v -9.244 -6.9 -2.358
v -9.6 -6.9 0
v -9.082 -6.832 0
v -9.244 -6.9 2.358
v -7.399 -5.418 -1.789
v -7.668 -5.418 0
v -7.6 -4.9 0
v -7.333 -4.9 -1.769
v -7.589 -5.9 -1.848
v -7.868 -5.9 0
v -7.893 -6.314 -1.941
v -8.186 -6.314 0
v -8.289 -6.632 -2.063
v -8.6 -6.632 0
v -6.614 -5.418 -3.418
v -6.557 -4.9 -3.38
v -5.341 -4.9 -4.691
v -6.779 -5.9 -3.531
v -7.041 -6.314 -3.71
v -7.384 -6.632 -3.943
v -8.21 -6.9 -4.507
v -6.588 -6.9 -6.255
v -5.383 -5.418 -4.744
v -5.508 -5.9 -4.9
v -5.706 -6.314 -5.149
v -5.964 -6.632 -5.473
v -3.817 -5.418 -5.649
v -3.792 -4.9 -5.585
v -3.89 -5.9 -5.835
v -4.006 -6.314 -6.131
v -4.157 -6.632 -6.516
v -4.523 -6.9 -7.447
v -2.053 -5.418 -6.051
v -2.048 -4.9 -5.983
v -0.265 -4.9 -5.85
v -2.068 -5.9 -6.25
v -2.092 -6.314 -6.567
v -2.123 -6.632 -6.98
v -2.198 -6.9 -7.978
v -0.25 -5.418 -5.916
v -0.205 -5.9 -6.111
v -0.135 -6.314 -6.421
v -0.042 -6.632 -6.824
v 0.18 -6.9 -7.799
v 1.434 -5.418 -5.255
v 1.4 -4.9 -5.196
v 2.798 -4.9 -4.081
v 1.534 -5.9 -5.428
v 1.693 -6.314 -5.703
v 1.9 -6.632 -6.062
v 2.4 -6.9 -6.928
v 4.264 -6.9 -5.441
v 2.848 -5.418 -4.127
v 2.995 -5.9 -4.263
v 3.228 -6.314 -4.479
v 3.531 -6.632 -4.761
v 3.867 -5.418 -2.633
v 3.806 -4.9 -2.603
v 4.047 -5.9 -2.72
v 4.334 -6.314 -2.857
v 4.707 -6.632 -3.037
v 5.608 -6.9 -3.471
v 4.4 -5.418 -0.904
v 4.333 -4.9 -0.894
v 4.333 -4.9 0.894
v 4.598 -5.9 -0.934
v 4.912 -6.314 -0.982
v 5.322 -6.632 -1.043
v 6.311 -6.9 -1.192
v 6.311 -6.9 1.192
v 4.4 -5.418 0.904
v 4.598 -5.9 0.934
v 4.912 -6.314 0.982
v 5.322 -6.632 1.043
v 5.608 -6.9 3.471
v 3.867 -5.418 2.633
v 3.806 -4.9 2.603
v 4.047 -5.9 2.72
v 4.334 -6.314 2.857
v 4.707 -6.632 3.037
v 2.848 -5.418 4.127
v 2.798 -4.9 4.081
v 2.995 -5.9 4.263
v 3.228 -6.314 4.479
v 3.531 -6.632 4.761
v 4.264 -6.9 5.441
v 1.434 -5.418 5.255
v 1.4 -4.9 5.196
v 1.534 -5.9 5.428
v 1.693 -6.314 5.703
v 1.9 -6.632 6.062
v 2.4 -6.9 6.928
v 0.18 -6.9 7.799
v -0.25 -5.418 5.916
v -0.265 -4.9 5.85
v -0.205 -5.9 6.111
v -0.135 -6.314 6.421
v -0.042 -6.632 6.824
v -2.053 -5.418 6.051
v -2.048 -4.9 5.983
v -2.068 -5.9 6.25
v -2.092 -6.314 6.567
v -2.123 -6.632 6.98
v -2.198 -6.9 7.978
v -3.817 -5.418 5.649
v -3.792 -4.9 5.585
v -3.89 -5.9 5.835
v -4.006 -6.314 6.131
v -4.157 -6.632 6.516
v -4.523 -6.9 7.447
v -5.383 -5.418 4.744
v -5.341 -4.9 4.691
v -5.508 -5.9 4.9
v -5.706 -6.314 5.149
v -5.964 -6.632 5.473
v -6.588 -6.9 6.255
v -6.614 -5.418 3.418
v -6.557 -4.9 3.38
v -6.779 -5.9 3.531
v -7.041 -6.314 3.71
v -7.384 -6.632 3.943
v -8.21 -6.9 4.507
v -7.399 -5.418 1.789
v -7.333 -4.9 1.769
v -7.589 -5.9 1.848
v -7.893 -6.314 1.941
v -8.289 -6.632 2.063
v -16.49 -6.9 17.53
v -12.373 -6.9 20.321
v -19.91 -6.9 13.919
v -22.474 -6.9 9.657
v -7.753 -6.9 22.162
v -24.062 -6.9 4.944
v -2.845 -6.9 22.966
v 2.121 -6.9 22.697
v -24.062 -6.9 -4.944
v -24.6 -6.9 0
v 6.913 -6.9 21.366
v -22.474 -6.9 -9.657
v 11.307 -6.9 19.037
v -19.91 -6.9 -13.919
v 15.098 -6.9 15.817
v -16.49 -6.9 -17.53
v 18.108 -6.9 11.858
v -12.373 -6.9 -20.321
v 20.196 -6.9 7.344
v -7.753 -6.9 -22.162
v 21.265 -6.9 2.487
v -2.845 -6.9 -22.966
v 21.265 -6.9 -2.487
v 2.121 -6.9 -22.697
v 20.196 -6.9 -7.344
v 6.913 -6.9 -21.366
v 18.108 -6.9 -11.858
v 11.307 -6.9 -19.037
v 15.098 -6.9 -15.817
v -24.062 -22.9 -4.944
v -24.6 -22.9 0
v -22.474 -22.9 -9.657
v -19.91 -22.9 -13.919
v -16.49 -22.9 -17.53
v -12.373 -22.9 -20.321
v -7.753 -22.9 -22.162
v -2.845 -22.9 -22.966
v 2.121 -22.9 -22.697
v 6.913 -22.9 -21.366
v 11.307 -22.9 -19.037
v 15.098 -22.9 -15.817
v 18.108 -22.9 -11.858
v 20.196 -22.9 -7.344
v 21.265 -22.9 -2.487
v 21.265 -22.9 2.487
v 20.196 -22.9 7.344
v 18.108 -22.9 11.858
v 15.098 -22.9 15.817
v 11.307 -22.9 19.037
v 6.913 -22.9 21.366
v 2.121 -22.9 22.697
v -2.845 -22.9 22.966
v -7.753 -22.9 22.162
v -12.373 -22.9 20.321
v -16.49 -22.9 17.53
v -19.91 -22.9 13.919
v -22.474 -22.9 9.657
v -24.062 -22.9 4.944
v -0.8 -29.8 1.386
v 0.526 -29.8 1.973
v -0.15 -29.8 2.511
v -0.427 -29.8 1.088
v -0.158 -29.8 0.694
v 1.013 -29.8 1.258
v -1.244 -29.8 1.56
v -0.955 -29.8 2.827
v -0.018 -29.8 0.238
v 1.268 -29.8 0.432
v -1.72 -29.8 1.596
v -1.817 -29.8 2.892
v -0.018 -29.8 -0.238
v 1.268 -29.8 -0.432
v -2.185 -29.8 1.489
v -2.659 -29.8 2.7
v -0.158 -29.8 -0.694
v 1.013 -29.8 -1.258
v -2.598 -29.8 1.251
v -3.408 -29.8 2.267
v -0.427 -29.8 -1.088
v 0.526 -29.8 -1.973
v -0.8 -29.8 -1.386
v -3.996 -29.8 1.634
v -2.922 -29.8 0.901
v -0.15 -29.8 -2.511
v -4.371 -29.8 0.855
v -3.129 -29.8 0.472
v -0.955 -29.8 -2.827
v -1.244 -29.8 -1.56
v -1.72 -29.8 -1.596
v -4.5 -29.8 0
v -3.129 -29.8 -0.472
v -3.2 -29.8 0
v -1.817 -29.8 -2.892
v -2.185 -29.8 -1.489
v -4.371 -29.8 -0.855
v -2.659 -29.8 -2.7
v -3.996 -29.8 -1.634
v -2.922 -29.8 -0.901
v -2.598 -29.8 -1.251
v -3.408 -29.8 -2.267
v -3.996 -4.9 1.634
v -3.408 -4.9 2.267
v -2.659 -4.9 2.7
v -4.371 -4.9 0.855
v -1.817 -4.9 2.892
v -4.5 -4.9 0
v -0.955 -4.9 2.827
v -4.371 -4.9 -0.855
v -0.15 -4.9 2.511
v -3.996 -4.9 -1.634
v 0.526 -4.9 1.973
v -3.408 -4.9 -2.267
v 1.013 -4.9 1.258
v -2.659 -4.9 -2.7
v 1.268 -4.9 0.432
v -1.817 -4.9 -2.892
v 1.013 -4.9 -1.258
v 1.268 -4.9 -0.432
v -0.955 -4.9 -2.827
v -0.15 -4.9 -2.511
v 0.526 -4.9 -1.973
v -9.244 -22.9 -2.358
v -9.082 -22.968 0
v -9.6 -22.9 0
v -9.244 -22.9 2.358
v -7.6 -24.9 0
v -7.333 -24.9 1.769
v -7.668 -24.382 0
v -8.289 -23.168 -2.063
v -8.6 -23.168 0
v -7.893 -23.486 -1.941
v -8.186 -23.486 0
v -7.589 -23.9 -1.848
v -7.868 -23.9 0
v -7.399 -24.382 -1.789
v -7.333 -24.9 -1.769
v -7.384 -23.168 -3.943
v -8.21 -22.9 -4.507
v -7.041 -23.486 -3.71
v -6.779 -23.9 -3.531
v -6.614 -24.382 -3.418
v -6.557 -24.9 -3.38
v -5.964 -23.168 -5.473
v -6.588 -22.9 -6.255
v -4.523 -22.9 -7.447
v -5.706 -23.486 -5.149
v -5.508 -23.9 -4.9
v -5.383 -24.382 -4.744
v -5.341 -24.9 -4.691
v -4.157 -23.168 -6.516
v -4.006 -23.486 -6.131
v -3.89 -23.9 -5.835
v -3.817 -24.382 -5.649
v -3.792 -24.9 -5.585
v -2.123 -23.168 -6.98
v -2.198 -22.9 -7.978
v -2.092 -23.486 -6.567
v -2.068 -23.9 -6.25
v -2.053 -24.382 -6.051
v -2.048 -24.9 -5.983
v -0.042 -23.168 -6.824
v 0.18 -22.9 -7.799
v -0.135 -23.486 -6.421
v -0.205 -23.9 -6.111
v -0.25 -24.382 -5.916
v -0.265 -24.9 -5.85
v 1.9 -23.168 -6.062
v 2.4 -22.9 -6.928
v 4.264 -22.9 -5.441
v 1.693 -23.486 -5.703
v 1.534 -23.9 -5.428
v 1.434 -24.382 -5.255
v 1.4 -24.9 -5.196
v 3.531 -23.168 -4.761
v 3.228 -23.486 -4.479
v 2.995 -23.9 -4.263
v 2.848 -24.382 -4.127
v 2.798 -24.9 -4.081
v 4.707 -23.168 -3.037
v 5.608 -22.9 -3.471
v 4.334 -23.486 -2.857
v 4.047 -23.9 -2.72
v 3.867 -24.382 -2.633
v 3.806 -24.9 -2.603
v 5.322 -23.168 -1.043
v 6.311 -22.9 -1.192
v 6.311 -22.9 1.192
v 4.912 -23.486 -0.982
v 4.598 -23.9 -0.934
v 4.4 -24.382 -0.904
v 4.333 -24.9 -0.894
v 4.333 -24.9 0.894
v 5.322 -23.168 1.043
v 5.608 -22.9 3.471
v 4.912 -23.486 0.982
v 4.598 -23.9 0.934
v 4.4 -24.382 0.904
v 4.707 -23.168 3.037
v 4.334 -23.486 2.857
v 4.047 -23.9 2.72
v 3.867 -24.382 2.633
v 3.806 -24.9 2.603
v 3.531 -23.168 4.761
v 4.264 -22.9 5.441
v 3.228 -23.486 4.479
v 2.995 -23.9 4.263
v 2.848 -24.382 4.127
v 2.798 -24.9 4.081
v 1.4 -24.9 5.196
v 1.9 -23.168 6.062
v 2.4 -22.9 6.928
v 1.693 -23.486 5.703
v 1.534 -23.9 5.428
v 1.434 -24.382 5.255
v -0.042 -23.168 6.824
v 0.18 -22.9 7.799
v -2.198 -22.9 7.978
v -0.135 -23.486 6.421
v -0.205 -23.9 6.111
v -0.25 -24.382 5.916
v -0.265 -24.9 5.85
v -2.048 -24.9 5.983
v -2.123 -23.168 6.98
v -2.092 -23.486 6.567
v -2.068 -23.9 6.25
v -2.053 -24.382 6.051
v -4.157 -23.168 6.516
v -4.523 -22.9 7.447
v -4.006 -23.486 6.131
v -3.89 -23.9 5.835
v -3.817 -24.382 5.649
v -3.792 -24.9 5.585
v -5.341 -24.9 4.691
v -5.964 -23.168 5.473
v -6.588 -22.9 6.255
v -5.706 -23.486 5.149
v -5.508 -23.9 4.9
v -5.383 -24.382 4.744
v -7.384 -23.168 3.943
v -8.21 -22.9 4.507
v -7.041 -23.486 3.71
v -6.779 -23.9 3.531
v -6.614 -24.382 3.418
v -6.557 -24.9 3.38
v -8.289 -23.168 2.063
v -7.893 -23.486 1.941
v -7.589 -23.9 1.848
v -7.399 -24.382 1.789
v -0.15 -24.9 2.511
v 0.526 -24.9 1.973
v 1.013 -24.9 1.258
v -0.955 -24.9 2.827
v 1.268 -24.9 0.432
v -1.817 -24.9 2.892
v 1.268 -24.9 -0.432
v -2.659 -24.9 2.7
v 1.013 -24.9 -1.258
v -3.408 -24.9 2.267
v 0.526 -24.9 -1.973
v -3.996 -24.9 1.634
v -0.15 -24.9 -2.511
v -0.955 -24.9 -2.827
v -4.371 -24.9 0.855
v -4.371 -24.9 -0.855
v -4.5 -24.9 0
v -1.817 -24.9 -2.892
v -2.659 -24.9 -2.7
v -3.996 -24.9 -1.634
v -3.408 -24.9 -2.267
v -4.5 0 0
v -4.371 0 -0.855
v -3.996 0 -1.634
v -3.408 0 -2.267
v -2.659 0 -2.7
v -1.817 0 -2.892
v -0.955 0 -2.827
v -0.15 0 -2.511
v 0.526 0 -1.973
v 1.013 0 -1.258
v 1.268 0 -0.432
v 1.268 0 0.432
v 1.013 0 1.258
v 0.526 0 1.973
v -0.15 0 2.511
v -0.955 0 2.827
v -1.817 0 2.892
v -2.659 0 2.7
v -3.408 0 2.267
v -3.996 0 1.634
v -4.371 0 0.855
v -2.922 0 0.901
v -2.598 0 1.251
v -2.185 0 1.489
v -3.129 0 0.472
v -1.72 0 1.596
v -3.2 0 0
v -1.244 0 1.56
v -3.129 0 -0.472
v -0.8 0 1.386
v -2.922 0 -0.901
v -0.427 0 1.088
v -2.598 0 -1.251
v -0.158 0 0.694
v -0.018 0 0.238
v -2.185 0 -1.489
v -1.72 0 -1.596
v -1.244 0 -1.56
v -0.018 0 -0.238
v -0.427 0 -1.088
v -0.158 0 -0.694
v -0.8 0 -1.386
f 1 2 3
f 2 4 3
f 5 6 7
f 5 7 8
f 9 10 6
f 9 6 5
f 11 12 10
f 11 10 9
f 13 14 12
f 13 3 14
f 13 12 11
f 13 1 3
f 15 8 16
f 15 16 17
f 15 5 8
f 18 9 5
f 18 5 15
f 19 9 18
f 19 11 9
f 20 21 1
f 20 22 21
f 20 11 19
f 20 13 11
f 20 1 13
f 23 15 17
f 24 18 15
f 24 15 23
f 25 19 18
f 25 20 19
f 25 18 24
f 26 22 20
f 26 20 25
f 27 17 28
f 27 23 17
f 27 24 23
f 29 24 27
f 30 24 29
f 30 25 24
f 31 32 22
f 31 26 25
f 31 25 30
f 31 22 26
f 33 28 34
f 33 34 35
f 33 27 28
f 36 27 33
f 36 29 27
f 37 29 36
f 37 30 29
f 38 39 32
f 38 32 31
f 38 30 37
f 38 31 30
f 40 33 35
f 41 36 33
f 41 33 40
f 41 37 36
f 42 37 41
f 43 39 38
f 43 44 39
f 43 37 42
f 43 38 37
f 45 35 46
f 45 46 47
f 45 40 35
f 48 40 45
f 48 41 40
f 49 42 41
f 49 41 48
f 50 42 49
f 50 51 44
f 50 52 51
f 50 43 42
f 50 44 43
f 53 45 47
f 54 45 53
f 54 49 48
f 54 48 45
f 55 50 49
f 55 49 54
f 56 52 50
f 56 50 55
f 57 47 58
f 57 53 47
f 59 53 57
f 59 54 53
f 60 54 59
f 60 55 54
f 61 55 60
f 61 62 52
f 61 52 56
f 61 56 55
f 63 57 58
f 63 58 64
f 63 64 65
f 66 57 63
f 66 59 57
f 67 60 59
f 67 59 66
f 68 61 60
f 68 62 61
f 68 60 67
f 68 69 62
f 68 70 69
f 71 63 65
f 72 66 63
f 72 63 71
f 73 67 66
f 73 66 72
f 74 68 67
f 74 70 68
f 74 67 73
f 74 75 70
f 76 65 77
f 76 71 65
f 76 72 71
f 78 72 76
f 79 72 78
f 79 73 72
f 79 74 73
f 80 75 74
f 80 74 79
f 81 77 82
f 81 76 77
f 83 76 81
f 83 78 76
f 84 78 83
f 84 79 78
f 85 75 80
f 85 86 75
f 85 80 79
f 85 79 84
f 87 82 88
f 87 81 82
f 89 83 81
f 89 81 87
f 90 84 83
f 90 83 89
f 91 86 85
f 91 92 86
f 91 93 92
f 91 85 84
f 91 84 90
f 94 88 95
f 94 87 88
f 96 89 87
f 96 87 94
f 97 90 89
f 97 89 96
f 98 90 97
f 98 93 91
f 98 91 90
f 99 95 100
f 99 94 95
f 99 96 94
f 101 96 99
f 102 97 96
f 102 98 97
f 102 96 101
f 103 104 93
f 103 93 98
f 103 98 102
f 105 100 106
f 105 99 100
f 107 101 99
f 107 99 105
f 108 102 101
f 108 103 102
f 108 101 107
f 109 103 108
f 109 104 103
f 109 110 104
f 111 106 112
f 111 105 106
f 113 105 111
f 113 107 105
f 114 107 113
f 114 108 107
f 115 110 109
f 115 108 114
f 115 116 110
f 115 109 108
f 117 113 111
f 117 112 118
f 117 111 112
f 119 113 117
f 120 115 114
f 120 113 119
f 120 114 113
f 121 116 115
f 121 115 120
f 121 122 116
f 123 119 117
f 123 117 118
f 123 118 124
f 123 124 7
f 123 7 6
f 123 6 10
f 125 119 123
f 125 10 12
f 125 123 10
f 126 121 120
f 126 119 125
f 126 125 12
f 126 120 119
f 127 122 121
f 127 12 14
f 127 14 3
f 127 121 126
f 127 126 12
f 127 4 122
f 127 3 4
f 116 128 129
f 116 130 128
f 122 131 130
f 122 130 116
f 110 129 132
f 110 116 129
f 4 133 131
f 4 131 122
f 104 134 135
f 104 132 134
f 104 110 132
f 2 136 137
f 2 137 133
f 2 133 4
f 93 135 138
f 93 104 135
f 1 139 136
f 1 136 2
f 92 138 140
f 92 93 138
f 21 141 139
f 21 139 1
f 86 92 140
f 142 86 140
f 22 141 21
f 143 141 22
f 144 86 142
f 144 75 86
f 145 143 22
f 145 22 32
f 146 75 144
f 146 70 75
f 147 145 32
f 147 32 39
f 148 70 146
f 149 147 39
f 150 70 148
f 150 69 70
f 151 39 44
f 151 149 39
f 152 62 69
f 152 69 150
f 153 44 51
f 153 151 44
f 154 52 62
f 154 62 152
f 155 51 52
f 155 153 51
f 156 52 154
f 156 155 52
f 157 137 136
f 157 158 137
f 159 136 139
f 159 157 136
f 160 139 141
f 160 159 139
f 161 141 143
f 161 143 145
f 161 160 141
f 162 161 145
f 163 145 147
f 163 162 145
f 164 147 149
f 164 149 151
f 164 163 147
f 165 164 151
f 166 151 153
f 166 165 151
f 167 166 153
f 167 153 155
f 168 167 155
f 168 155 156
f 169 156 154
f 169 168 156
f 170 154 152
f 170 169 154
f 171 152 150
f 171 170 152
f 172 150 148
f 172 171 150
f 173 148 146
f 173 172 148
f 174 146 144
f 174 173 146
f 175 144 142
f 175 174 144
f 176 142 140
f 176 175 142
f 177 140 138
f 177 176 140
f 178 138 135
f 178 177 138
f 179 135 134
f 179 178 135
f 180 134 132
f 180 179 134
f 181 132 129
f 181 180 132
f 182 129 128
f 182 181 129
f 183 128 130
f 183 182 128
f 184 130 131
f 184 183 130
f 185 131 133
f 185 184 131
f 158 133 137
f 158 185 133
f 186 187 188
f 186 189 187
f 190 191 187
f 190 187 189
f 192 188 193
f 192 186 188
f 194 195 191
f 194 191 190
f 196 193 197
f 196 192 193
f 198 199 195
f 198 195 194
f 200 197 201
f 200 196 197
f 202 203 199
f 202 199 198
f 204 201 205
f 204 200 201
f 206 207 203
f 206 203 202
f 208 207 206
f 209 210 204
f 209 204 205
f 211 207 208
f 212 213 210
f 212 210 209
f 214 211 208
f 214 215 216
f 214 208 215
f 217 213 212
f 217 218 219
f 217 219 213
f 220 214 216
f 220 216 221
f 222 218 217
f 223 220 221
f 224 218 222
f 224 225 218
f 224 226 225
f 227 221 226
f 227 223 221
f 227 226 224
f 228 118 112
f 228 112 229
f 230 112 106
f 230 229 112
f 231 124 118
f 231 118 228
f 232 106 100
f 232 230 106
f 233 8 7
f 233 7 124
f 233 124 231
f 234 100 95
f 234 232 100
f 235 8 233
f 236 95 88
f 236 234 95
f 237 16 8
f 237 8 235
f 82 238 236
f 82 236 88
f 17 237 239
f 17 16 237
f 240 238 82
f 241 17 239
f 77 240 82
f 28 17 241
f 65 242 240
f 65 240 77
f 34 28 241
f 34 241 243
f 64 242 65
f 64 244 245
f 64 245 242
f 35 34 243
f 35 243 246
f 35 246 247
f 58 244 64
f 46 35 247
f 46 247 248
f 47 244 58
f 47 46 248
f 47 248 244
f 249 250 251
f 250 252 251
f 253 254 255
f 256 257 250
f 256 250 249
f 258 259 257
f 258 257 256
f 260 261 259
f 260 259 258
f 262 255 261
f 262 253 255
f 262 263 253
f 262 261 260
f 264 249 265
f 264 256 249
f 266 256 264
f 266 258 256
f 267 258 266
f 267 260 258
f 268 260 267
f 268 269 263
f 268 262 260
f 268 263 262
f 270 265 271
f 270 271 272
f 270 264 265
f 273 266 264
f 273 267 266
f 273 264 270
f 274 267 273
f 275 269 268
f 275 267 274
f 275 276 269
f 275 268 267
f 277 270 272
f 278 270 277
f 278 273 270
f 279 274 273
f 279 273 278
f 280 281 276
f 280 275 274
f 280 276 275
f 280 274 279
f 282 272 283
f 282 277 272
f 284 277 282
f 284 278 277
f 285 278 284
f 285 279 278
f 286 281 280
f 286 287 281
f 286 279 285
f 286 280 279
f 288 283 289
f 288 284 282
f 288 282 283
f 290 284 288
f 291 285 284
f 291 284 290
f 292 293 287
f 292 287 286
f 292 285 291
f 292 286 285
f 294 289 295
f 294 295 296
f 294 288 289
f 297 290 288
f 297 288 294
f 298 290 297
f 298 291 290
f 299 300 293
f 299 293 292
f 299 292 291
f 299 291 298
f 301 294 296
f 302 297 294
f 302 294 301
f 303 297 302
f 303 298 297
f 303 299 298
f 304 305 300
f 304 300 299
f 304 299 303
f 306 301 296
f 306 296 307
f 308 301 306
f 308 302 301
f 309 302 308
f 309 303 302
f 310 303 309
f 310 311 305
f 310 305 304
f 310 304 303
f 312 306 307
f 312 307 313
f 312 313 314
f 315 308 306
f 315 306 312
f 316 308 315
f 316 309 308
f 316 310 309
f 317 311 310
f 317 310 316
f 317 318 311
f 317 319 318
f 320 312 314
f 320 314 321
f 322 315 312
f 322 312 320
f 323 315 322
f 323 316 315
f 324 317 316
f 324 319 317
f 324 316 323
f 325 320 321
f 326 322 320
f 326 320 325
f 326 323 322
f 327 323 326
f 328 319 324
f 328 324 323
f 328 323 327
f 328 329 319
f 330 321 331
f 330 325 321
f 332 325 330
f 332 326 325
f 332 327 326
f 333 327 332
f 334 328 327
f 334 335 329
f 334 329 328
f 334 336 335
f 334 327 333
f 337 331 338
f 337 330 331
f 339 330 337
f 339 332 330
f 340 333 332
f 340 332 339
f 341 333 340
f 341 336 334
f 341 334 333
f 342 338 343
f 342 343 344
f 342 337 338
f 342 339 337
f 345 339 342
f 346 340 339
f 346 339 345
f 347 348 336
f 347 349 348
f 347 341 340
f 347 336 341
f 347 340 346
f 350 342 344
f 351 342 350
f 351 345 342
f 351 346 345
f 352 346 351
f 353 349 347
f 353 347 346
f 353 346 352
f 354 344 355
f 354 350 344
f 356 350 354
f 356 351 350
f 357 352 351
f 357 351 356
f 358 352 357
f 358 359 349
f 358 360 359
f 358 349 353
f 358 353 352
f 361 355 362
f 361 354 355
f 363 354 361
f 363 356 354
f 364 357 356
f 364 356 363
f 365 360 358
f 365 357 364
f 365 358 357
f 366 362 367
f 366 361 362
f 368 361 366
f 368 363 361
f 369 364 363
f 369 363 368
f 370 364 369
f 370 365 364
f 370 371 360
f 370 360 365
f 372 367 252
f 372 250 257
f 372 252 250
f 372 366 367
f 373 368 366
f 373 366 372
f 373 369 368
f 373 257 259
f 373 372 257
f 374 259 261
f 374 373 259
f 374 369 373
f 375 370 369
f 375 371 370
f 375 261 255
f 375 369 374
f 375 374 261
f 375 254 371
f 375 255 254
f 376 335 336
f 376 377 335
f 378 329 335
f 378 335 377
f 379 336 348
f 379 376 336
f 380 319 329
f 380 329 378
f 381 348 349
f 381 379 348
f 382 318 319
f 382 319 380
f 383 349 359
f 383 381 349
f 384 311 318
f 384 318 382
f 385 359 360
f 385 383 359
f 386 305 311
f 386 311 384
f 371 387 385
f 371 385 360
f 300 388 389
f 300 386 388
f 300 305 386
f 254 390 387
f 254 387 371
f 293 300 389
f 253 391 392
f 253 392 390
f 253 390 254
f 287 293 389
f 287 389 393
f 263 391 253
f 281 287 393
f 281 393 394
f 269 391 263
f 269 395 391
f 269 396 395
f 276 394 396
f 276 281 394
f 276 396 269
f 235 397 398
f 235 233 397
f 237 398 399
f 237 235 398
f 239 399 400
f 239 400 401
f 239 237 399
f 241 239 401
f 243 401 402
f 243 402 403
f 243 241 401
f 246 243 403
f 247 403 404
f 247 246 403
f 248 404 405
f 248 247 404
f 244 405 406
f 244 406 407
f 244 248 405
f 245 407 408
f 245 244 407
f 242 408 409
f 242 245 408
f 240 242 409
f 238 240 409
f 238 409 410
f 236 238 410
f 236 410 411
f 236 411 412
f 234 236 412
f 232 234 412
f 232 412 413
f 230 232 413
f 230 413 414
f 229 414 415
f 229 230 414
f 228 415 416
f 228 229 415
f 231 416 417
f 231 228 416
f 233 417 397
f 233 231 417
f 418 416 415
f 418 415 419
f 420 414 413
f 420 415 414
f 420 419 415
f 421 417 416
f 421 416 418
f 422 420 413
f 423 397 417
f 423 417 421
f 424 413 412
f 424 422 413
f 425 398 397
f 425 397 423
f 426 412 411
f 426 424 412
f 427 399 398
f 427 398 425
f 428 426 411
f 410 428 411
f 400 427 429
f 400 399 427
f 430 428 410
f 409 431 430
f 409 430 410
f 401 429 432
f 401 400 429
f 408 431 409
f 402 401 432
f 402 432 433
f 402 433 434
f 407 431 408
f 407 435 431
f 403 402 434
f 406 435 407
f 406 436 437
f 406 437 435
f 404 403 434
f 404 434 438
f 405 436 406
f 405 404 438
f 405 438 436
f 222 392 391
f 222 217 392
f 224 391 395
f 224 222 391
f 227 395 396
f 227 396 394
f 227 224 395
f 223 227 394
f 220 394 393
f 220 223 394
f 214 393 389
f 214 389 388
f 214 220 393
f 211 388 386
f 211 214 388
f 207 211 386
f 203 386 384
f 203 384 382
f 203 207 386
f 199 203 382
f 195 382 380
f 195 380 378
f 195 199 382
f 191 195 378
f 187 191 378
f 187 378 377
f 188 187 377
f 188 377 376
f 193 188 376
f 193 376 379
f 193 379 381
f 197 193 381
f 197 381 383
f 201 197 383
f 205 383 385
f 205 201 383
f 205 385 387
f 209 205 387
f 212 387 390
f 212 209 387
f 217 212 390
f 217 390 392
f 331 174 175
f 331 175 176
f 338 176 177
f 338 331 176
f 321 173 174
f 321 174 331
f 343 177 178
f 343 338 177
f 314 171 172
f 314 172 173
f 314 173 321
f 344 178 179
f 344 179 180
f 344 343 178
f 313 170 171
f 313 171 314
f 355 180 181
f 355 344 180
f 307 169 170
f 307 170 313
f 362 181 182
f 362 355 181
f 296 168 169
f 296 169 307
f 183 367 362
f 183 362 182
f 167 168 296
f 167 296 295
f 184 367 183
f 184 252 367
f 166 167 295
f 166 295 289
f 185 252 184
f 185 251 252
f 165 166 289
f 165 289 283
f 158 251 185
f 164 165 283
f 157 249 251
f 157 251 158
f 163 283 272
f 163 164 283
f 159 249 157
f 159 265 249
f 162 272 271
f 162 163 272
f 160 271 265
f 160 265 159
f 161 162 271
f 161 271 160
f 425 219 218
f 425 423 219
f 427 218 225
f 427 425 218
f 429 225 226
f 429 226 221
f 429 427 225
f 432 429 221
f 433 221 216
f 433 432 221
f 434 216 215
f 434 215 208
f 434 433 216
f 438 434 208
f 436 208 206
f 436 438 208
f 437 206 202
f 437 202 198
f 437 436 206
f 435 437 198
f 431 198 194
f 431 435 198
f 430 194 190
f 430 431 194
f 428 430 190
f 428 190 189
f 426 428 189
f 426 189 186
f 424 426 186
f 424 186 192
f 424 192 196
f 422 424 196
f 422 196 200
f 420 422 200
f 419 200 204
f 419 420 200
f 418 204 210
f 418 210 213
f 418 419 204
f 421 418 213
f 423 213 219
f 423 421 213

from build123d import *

# Parameters (mm, degrees)
FILLET_1_R = 2


with BuildPart() as part:
    # 草图1 → 旋转1 (revolve)
    with BuildSketch(Plane.XY, mode=Mode.PRIVATE) as revolve_1_sk:
        Polygon((0, 0), (1.3, 0), (1.3, -4.9), (4.4, -4.9), (4.4, -6.9), (21.4, -6.9), (21.4, -22.9), (4.4, -22.9), (4.4, -24.9), (1.3, -24.9), (1.3, -29.8), (0, -29.8), align=None)
    revolve(revolve_1_sk.sketch.rotate(Axis((-1.6, 5.739994567, 0), (0, -1, 0)), 180), axis=Axis((-1.6, 5.739994567, 0), (0, -1, 0)))

    # 圆角1
    fillet_1_edges = [part.edges().sort_by_distance(p)[0] for p in [
        (4.4, -22.9, 0),
        (4.4, -6.9, 0),
    ]]
    fillet(fillet_1_edges, radius=FILLET_1_R - 0.0001)  # a hair under: the kernel refuses the full size


solid = part.part
